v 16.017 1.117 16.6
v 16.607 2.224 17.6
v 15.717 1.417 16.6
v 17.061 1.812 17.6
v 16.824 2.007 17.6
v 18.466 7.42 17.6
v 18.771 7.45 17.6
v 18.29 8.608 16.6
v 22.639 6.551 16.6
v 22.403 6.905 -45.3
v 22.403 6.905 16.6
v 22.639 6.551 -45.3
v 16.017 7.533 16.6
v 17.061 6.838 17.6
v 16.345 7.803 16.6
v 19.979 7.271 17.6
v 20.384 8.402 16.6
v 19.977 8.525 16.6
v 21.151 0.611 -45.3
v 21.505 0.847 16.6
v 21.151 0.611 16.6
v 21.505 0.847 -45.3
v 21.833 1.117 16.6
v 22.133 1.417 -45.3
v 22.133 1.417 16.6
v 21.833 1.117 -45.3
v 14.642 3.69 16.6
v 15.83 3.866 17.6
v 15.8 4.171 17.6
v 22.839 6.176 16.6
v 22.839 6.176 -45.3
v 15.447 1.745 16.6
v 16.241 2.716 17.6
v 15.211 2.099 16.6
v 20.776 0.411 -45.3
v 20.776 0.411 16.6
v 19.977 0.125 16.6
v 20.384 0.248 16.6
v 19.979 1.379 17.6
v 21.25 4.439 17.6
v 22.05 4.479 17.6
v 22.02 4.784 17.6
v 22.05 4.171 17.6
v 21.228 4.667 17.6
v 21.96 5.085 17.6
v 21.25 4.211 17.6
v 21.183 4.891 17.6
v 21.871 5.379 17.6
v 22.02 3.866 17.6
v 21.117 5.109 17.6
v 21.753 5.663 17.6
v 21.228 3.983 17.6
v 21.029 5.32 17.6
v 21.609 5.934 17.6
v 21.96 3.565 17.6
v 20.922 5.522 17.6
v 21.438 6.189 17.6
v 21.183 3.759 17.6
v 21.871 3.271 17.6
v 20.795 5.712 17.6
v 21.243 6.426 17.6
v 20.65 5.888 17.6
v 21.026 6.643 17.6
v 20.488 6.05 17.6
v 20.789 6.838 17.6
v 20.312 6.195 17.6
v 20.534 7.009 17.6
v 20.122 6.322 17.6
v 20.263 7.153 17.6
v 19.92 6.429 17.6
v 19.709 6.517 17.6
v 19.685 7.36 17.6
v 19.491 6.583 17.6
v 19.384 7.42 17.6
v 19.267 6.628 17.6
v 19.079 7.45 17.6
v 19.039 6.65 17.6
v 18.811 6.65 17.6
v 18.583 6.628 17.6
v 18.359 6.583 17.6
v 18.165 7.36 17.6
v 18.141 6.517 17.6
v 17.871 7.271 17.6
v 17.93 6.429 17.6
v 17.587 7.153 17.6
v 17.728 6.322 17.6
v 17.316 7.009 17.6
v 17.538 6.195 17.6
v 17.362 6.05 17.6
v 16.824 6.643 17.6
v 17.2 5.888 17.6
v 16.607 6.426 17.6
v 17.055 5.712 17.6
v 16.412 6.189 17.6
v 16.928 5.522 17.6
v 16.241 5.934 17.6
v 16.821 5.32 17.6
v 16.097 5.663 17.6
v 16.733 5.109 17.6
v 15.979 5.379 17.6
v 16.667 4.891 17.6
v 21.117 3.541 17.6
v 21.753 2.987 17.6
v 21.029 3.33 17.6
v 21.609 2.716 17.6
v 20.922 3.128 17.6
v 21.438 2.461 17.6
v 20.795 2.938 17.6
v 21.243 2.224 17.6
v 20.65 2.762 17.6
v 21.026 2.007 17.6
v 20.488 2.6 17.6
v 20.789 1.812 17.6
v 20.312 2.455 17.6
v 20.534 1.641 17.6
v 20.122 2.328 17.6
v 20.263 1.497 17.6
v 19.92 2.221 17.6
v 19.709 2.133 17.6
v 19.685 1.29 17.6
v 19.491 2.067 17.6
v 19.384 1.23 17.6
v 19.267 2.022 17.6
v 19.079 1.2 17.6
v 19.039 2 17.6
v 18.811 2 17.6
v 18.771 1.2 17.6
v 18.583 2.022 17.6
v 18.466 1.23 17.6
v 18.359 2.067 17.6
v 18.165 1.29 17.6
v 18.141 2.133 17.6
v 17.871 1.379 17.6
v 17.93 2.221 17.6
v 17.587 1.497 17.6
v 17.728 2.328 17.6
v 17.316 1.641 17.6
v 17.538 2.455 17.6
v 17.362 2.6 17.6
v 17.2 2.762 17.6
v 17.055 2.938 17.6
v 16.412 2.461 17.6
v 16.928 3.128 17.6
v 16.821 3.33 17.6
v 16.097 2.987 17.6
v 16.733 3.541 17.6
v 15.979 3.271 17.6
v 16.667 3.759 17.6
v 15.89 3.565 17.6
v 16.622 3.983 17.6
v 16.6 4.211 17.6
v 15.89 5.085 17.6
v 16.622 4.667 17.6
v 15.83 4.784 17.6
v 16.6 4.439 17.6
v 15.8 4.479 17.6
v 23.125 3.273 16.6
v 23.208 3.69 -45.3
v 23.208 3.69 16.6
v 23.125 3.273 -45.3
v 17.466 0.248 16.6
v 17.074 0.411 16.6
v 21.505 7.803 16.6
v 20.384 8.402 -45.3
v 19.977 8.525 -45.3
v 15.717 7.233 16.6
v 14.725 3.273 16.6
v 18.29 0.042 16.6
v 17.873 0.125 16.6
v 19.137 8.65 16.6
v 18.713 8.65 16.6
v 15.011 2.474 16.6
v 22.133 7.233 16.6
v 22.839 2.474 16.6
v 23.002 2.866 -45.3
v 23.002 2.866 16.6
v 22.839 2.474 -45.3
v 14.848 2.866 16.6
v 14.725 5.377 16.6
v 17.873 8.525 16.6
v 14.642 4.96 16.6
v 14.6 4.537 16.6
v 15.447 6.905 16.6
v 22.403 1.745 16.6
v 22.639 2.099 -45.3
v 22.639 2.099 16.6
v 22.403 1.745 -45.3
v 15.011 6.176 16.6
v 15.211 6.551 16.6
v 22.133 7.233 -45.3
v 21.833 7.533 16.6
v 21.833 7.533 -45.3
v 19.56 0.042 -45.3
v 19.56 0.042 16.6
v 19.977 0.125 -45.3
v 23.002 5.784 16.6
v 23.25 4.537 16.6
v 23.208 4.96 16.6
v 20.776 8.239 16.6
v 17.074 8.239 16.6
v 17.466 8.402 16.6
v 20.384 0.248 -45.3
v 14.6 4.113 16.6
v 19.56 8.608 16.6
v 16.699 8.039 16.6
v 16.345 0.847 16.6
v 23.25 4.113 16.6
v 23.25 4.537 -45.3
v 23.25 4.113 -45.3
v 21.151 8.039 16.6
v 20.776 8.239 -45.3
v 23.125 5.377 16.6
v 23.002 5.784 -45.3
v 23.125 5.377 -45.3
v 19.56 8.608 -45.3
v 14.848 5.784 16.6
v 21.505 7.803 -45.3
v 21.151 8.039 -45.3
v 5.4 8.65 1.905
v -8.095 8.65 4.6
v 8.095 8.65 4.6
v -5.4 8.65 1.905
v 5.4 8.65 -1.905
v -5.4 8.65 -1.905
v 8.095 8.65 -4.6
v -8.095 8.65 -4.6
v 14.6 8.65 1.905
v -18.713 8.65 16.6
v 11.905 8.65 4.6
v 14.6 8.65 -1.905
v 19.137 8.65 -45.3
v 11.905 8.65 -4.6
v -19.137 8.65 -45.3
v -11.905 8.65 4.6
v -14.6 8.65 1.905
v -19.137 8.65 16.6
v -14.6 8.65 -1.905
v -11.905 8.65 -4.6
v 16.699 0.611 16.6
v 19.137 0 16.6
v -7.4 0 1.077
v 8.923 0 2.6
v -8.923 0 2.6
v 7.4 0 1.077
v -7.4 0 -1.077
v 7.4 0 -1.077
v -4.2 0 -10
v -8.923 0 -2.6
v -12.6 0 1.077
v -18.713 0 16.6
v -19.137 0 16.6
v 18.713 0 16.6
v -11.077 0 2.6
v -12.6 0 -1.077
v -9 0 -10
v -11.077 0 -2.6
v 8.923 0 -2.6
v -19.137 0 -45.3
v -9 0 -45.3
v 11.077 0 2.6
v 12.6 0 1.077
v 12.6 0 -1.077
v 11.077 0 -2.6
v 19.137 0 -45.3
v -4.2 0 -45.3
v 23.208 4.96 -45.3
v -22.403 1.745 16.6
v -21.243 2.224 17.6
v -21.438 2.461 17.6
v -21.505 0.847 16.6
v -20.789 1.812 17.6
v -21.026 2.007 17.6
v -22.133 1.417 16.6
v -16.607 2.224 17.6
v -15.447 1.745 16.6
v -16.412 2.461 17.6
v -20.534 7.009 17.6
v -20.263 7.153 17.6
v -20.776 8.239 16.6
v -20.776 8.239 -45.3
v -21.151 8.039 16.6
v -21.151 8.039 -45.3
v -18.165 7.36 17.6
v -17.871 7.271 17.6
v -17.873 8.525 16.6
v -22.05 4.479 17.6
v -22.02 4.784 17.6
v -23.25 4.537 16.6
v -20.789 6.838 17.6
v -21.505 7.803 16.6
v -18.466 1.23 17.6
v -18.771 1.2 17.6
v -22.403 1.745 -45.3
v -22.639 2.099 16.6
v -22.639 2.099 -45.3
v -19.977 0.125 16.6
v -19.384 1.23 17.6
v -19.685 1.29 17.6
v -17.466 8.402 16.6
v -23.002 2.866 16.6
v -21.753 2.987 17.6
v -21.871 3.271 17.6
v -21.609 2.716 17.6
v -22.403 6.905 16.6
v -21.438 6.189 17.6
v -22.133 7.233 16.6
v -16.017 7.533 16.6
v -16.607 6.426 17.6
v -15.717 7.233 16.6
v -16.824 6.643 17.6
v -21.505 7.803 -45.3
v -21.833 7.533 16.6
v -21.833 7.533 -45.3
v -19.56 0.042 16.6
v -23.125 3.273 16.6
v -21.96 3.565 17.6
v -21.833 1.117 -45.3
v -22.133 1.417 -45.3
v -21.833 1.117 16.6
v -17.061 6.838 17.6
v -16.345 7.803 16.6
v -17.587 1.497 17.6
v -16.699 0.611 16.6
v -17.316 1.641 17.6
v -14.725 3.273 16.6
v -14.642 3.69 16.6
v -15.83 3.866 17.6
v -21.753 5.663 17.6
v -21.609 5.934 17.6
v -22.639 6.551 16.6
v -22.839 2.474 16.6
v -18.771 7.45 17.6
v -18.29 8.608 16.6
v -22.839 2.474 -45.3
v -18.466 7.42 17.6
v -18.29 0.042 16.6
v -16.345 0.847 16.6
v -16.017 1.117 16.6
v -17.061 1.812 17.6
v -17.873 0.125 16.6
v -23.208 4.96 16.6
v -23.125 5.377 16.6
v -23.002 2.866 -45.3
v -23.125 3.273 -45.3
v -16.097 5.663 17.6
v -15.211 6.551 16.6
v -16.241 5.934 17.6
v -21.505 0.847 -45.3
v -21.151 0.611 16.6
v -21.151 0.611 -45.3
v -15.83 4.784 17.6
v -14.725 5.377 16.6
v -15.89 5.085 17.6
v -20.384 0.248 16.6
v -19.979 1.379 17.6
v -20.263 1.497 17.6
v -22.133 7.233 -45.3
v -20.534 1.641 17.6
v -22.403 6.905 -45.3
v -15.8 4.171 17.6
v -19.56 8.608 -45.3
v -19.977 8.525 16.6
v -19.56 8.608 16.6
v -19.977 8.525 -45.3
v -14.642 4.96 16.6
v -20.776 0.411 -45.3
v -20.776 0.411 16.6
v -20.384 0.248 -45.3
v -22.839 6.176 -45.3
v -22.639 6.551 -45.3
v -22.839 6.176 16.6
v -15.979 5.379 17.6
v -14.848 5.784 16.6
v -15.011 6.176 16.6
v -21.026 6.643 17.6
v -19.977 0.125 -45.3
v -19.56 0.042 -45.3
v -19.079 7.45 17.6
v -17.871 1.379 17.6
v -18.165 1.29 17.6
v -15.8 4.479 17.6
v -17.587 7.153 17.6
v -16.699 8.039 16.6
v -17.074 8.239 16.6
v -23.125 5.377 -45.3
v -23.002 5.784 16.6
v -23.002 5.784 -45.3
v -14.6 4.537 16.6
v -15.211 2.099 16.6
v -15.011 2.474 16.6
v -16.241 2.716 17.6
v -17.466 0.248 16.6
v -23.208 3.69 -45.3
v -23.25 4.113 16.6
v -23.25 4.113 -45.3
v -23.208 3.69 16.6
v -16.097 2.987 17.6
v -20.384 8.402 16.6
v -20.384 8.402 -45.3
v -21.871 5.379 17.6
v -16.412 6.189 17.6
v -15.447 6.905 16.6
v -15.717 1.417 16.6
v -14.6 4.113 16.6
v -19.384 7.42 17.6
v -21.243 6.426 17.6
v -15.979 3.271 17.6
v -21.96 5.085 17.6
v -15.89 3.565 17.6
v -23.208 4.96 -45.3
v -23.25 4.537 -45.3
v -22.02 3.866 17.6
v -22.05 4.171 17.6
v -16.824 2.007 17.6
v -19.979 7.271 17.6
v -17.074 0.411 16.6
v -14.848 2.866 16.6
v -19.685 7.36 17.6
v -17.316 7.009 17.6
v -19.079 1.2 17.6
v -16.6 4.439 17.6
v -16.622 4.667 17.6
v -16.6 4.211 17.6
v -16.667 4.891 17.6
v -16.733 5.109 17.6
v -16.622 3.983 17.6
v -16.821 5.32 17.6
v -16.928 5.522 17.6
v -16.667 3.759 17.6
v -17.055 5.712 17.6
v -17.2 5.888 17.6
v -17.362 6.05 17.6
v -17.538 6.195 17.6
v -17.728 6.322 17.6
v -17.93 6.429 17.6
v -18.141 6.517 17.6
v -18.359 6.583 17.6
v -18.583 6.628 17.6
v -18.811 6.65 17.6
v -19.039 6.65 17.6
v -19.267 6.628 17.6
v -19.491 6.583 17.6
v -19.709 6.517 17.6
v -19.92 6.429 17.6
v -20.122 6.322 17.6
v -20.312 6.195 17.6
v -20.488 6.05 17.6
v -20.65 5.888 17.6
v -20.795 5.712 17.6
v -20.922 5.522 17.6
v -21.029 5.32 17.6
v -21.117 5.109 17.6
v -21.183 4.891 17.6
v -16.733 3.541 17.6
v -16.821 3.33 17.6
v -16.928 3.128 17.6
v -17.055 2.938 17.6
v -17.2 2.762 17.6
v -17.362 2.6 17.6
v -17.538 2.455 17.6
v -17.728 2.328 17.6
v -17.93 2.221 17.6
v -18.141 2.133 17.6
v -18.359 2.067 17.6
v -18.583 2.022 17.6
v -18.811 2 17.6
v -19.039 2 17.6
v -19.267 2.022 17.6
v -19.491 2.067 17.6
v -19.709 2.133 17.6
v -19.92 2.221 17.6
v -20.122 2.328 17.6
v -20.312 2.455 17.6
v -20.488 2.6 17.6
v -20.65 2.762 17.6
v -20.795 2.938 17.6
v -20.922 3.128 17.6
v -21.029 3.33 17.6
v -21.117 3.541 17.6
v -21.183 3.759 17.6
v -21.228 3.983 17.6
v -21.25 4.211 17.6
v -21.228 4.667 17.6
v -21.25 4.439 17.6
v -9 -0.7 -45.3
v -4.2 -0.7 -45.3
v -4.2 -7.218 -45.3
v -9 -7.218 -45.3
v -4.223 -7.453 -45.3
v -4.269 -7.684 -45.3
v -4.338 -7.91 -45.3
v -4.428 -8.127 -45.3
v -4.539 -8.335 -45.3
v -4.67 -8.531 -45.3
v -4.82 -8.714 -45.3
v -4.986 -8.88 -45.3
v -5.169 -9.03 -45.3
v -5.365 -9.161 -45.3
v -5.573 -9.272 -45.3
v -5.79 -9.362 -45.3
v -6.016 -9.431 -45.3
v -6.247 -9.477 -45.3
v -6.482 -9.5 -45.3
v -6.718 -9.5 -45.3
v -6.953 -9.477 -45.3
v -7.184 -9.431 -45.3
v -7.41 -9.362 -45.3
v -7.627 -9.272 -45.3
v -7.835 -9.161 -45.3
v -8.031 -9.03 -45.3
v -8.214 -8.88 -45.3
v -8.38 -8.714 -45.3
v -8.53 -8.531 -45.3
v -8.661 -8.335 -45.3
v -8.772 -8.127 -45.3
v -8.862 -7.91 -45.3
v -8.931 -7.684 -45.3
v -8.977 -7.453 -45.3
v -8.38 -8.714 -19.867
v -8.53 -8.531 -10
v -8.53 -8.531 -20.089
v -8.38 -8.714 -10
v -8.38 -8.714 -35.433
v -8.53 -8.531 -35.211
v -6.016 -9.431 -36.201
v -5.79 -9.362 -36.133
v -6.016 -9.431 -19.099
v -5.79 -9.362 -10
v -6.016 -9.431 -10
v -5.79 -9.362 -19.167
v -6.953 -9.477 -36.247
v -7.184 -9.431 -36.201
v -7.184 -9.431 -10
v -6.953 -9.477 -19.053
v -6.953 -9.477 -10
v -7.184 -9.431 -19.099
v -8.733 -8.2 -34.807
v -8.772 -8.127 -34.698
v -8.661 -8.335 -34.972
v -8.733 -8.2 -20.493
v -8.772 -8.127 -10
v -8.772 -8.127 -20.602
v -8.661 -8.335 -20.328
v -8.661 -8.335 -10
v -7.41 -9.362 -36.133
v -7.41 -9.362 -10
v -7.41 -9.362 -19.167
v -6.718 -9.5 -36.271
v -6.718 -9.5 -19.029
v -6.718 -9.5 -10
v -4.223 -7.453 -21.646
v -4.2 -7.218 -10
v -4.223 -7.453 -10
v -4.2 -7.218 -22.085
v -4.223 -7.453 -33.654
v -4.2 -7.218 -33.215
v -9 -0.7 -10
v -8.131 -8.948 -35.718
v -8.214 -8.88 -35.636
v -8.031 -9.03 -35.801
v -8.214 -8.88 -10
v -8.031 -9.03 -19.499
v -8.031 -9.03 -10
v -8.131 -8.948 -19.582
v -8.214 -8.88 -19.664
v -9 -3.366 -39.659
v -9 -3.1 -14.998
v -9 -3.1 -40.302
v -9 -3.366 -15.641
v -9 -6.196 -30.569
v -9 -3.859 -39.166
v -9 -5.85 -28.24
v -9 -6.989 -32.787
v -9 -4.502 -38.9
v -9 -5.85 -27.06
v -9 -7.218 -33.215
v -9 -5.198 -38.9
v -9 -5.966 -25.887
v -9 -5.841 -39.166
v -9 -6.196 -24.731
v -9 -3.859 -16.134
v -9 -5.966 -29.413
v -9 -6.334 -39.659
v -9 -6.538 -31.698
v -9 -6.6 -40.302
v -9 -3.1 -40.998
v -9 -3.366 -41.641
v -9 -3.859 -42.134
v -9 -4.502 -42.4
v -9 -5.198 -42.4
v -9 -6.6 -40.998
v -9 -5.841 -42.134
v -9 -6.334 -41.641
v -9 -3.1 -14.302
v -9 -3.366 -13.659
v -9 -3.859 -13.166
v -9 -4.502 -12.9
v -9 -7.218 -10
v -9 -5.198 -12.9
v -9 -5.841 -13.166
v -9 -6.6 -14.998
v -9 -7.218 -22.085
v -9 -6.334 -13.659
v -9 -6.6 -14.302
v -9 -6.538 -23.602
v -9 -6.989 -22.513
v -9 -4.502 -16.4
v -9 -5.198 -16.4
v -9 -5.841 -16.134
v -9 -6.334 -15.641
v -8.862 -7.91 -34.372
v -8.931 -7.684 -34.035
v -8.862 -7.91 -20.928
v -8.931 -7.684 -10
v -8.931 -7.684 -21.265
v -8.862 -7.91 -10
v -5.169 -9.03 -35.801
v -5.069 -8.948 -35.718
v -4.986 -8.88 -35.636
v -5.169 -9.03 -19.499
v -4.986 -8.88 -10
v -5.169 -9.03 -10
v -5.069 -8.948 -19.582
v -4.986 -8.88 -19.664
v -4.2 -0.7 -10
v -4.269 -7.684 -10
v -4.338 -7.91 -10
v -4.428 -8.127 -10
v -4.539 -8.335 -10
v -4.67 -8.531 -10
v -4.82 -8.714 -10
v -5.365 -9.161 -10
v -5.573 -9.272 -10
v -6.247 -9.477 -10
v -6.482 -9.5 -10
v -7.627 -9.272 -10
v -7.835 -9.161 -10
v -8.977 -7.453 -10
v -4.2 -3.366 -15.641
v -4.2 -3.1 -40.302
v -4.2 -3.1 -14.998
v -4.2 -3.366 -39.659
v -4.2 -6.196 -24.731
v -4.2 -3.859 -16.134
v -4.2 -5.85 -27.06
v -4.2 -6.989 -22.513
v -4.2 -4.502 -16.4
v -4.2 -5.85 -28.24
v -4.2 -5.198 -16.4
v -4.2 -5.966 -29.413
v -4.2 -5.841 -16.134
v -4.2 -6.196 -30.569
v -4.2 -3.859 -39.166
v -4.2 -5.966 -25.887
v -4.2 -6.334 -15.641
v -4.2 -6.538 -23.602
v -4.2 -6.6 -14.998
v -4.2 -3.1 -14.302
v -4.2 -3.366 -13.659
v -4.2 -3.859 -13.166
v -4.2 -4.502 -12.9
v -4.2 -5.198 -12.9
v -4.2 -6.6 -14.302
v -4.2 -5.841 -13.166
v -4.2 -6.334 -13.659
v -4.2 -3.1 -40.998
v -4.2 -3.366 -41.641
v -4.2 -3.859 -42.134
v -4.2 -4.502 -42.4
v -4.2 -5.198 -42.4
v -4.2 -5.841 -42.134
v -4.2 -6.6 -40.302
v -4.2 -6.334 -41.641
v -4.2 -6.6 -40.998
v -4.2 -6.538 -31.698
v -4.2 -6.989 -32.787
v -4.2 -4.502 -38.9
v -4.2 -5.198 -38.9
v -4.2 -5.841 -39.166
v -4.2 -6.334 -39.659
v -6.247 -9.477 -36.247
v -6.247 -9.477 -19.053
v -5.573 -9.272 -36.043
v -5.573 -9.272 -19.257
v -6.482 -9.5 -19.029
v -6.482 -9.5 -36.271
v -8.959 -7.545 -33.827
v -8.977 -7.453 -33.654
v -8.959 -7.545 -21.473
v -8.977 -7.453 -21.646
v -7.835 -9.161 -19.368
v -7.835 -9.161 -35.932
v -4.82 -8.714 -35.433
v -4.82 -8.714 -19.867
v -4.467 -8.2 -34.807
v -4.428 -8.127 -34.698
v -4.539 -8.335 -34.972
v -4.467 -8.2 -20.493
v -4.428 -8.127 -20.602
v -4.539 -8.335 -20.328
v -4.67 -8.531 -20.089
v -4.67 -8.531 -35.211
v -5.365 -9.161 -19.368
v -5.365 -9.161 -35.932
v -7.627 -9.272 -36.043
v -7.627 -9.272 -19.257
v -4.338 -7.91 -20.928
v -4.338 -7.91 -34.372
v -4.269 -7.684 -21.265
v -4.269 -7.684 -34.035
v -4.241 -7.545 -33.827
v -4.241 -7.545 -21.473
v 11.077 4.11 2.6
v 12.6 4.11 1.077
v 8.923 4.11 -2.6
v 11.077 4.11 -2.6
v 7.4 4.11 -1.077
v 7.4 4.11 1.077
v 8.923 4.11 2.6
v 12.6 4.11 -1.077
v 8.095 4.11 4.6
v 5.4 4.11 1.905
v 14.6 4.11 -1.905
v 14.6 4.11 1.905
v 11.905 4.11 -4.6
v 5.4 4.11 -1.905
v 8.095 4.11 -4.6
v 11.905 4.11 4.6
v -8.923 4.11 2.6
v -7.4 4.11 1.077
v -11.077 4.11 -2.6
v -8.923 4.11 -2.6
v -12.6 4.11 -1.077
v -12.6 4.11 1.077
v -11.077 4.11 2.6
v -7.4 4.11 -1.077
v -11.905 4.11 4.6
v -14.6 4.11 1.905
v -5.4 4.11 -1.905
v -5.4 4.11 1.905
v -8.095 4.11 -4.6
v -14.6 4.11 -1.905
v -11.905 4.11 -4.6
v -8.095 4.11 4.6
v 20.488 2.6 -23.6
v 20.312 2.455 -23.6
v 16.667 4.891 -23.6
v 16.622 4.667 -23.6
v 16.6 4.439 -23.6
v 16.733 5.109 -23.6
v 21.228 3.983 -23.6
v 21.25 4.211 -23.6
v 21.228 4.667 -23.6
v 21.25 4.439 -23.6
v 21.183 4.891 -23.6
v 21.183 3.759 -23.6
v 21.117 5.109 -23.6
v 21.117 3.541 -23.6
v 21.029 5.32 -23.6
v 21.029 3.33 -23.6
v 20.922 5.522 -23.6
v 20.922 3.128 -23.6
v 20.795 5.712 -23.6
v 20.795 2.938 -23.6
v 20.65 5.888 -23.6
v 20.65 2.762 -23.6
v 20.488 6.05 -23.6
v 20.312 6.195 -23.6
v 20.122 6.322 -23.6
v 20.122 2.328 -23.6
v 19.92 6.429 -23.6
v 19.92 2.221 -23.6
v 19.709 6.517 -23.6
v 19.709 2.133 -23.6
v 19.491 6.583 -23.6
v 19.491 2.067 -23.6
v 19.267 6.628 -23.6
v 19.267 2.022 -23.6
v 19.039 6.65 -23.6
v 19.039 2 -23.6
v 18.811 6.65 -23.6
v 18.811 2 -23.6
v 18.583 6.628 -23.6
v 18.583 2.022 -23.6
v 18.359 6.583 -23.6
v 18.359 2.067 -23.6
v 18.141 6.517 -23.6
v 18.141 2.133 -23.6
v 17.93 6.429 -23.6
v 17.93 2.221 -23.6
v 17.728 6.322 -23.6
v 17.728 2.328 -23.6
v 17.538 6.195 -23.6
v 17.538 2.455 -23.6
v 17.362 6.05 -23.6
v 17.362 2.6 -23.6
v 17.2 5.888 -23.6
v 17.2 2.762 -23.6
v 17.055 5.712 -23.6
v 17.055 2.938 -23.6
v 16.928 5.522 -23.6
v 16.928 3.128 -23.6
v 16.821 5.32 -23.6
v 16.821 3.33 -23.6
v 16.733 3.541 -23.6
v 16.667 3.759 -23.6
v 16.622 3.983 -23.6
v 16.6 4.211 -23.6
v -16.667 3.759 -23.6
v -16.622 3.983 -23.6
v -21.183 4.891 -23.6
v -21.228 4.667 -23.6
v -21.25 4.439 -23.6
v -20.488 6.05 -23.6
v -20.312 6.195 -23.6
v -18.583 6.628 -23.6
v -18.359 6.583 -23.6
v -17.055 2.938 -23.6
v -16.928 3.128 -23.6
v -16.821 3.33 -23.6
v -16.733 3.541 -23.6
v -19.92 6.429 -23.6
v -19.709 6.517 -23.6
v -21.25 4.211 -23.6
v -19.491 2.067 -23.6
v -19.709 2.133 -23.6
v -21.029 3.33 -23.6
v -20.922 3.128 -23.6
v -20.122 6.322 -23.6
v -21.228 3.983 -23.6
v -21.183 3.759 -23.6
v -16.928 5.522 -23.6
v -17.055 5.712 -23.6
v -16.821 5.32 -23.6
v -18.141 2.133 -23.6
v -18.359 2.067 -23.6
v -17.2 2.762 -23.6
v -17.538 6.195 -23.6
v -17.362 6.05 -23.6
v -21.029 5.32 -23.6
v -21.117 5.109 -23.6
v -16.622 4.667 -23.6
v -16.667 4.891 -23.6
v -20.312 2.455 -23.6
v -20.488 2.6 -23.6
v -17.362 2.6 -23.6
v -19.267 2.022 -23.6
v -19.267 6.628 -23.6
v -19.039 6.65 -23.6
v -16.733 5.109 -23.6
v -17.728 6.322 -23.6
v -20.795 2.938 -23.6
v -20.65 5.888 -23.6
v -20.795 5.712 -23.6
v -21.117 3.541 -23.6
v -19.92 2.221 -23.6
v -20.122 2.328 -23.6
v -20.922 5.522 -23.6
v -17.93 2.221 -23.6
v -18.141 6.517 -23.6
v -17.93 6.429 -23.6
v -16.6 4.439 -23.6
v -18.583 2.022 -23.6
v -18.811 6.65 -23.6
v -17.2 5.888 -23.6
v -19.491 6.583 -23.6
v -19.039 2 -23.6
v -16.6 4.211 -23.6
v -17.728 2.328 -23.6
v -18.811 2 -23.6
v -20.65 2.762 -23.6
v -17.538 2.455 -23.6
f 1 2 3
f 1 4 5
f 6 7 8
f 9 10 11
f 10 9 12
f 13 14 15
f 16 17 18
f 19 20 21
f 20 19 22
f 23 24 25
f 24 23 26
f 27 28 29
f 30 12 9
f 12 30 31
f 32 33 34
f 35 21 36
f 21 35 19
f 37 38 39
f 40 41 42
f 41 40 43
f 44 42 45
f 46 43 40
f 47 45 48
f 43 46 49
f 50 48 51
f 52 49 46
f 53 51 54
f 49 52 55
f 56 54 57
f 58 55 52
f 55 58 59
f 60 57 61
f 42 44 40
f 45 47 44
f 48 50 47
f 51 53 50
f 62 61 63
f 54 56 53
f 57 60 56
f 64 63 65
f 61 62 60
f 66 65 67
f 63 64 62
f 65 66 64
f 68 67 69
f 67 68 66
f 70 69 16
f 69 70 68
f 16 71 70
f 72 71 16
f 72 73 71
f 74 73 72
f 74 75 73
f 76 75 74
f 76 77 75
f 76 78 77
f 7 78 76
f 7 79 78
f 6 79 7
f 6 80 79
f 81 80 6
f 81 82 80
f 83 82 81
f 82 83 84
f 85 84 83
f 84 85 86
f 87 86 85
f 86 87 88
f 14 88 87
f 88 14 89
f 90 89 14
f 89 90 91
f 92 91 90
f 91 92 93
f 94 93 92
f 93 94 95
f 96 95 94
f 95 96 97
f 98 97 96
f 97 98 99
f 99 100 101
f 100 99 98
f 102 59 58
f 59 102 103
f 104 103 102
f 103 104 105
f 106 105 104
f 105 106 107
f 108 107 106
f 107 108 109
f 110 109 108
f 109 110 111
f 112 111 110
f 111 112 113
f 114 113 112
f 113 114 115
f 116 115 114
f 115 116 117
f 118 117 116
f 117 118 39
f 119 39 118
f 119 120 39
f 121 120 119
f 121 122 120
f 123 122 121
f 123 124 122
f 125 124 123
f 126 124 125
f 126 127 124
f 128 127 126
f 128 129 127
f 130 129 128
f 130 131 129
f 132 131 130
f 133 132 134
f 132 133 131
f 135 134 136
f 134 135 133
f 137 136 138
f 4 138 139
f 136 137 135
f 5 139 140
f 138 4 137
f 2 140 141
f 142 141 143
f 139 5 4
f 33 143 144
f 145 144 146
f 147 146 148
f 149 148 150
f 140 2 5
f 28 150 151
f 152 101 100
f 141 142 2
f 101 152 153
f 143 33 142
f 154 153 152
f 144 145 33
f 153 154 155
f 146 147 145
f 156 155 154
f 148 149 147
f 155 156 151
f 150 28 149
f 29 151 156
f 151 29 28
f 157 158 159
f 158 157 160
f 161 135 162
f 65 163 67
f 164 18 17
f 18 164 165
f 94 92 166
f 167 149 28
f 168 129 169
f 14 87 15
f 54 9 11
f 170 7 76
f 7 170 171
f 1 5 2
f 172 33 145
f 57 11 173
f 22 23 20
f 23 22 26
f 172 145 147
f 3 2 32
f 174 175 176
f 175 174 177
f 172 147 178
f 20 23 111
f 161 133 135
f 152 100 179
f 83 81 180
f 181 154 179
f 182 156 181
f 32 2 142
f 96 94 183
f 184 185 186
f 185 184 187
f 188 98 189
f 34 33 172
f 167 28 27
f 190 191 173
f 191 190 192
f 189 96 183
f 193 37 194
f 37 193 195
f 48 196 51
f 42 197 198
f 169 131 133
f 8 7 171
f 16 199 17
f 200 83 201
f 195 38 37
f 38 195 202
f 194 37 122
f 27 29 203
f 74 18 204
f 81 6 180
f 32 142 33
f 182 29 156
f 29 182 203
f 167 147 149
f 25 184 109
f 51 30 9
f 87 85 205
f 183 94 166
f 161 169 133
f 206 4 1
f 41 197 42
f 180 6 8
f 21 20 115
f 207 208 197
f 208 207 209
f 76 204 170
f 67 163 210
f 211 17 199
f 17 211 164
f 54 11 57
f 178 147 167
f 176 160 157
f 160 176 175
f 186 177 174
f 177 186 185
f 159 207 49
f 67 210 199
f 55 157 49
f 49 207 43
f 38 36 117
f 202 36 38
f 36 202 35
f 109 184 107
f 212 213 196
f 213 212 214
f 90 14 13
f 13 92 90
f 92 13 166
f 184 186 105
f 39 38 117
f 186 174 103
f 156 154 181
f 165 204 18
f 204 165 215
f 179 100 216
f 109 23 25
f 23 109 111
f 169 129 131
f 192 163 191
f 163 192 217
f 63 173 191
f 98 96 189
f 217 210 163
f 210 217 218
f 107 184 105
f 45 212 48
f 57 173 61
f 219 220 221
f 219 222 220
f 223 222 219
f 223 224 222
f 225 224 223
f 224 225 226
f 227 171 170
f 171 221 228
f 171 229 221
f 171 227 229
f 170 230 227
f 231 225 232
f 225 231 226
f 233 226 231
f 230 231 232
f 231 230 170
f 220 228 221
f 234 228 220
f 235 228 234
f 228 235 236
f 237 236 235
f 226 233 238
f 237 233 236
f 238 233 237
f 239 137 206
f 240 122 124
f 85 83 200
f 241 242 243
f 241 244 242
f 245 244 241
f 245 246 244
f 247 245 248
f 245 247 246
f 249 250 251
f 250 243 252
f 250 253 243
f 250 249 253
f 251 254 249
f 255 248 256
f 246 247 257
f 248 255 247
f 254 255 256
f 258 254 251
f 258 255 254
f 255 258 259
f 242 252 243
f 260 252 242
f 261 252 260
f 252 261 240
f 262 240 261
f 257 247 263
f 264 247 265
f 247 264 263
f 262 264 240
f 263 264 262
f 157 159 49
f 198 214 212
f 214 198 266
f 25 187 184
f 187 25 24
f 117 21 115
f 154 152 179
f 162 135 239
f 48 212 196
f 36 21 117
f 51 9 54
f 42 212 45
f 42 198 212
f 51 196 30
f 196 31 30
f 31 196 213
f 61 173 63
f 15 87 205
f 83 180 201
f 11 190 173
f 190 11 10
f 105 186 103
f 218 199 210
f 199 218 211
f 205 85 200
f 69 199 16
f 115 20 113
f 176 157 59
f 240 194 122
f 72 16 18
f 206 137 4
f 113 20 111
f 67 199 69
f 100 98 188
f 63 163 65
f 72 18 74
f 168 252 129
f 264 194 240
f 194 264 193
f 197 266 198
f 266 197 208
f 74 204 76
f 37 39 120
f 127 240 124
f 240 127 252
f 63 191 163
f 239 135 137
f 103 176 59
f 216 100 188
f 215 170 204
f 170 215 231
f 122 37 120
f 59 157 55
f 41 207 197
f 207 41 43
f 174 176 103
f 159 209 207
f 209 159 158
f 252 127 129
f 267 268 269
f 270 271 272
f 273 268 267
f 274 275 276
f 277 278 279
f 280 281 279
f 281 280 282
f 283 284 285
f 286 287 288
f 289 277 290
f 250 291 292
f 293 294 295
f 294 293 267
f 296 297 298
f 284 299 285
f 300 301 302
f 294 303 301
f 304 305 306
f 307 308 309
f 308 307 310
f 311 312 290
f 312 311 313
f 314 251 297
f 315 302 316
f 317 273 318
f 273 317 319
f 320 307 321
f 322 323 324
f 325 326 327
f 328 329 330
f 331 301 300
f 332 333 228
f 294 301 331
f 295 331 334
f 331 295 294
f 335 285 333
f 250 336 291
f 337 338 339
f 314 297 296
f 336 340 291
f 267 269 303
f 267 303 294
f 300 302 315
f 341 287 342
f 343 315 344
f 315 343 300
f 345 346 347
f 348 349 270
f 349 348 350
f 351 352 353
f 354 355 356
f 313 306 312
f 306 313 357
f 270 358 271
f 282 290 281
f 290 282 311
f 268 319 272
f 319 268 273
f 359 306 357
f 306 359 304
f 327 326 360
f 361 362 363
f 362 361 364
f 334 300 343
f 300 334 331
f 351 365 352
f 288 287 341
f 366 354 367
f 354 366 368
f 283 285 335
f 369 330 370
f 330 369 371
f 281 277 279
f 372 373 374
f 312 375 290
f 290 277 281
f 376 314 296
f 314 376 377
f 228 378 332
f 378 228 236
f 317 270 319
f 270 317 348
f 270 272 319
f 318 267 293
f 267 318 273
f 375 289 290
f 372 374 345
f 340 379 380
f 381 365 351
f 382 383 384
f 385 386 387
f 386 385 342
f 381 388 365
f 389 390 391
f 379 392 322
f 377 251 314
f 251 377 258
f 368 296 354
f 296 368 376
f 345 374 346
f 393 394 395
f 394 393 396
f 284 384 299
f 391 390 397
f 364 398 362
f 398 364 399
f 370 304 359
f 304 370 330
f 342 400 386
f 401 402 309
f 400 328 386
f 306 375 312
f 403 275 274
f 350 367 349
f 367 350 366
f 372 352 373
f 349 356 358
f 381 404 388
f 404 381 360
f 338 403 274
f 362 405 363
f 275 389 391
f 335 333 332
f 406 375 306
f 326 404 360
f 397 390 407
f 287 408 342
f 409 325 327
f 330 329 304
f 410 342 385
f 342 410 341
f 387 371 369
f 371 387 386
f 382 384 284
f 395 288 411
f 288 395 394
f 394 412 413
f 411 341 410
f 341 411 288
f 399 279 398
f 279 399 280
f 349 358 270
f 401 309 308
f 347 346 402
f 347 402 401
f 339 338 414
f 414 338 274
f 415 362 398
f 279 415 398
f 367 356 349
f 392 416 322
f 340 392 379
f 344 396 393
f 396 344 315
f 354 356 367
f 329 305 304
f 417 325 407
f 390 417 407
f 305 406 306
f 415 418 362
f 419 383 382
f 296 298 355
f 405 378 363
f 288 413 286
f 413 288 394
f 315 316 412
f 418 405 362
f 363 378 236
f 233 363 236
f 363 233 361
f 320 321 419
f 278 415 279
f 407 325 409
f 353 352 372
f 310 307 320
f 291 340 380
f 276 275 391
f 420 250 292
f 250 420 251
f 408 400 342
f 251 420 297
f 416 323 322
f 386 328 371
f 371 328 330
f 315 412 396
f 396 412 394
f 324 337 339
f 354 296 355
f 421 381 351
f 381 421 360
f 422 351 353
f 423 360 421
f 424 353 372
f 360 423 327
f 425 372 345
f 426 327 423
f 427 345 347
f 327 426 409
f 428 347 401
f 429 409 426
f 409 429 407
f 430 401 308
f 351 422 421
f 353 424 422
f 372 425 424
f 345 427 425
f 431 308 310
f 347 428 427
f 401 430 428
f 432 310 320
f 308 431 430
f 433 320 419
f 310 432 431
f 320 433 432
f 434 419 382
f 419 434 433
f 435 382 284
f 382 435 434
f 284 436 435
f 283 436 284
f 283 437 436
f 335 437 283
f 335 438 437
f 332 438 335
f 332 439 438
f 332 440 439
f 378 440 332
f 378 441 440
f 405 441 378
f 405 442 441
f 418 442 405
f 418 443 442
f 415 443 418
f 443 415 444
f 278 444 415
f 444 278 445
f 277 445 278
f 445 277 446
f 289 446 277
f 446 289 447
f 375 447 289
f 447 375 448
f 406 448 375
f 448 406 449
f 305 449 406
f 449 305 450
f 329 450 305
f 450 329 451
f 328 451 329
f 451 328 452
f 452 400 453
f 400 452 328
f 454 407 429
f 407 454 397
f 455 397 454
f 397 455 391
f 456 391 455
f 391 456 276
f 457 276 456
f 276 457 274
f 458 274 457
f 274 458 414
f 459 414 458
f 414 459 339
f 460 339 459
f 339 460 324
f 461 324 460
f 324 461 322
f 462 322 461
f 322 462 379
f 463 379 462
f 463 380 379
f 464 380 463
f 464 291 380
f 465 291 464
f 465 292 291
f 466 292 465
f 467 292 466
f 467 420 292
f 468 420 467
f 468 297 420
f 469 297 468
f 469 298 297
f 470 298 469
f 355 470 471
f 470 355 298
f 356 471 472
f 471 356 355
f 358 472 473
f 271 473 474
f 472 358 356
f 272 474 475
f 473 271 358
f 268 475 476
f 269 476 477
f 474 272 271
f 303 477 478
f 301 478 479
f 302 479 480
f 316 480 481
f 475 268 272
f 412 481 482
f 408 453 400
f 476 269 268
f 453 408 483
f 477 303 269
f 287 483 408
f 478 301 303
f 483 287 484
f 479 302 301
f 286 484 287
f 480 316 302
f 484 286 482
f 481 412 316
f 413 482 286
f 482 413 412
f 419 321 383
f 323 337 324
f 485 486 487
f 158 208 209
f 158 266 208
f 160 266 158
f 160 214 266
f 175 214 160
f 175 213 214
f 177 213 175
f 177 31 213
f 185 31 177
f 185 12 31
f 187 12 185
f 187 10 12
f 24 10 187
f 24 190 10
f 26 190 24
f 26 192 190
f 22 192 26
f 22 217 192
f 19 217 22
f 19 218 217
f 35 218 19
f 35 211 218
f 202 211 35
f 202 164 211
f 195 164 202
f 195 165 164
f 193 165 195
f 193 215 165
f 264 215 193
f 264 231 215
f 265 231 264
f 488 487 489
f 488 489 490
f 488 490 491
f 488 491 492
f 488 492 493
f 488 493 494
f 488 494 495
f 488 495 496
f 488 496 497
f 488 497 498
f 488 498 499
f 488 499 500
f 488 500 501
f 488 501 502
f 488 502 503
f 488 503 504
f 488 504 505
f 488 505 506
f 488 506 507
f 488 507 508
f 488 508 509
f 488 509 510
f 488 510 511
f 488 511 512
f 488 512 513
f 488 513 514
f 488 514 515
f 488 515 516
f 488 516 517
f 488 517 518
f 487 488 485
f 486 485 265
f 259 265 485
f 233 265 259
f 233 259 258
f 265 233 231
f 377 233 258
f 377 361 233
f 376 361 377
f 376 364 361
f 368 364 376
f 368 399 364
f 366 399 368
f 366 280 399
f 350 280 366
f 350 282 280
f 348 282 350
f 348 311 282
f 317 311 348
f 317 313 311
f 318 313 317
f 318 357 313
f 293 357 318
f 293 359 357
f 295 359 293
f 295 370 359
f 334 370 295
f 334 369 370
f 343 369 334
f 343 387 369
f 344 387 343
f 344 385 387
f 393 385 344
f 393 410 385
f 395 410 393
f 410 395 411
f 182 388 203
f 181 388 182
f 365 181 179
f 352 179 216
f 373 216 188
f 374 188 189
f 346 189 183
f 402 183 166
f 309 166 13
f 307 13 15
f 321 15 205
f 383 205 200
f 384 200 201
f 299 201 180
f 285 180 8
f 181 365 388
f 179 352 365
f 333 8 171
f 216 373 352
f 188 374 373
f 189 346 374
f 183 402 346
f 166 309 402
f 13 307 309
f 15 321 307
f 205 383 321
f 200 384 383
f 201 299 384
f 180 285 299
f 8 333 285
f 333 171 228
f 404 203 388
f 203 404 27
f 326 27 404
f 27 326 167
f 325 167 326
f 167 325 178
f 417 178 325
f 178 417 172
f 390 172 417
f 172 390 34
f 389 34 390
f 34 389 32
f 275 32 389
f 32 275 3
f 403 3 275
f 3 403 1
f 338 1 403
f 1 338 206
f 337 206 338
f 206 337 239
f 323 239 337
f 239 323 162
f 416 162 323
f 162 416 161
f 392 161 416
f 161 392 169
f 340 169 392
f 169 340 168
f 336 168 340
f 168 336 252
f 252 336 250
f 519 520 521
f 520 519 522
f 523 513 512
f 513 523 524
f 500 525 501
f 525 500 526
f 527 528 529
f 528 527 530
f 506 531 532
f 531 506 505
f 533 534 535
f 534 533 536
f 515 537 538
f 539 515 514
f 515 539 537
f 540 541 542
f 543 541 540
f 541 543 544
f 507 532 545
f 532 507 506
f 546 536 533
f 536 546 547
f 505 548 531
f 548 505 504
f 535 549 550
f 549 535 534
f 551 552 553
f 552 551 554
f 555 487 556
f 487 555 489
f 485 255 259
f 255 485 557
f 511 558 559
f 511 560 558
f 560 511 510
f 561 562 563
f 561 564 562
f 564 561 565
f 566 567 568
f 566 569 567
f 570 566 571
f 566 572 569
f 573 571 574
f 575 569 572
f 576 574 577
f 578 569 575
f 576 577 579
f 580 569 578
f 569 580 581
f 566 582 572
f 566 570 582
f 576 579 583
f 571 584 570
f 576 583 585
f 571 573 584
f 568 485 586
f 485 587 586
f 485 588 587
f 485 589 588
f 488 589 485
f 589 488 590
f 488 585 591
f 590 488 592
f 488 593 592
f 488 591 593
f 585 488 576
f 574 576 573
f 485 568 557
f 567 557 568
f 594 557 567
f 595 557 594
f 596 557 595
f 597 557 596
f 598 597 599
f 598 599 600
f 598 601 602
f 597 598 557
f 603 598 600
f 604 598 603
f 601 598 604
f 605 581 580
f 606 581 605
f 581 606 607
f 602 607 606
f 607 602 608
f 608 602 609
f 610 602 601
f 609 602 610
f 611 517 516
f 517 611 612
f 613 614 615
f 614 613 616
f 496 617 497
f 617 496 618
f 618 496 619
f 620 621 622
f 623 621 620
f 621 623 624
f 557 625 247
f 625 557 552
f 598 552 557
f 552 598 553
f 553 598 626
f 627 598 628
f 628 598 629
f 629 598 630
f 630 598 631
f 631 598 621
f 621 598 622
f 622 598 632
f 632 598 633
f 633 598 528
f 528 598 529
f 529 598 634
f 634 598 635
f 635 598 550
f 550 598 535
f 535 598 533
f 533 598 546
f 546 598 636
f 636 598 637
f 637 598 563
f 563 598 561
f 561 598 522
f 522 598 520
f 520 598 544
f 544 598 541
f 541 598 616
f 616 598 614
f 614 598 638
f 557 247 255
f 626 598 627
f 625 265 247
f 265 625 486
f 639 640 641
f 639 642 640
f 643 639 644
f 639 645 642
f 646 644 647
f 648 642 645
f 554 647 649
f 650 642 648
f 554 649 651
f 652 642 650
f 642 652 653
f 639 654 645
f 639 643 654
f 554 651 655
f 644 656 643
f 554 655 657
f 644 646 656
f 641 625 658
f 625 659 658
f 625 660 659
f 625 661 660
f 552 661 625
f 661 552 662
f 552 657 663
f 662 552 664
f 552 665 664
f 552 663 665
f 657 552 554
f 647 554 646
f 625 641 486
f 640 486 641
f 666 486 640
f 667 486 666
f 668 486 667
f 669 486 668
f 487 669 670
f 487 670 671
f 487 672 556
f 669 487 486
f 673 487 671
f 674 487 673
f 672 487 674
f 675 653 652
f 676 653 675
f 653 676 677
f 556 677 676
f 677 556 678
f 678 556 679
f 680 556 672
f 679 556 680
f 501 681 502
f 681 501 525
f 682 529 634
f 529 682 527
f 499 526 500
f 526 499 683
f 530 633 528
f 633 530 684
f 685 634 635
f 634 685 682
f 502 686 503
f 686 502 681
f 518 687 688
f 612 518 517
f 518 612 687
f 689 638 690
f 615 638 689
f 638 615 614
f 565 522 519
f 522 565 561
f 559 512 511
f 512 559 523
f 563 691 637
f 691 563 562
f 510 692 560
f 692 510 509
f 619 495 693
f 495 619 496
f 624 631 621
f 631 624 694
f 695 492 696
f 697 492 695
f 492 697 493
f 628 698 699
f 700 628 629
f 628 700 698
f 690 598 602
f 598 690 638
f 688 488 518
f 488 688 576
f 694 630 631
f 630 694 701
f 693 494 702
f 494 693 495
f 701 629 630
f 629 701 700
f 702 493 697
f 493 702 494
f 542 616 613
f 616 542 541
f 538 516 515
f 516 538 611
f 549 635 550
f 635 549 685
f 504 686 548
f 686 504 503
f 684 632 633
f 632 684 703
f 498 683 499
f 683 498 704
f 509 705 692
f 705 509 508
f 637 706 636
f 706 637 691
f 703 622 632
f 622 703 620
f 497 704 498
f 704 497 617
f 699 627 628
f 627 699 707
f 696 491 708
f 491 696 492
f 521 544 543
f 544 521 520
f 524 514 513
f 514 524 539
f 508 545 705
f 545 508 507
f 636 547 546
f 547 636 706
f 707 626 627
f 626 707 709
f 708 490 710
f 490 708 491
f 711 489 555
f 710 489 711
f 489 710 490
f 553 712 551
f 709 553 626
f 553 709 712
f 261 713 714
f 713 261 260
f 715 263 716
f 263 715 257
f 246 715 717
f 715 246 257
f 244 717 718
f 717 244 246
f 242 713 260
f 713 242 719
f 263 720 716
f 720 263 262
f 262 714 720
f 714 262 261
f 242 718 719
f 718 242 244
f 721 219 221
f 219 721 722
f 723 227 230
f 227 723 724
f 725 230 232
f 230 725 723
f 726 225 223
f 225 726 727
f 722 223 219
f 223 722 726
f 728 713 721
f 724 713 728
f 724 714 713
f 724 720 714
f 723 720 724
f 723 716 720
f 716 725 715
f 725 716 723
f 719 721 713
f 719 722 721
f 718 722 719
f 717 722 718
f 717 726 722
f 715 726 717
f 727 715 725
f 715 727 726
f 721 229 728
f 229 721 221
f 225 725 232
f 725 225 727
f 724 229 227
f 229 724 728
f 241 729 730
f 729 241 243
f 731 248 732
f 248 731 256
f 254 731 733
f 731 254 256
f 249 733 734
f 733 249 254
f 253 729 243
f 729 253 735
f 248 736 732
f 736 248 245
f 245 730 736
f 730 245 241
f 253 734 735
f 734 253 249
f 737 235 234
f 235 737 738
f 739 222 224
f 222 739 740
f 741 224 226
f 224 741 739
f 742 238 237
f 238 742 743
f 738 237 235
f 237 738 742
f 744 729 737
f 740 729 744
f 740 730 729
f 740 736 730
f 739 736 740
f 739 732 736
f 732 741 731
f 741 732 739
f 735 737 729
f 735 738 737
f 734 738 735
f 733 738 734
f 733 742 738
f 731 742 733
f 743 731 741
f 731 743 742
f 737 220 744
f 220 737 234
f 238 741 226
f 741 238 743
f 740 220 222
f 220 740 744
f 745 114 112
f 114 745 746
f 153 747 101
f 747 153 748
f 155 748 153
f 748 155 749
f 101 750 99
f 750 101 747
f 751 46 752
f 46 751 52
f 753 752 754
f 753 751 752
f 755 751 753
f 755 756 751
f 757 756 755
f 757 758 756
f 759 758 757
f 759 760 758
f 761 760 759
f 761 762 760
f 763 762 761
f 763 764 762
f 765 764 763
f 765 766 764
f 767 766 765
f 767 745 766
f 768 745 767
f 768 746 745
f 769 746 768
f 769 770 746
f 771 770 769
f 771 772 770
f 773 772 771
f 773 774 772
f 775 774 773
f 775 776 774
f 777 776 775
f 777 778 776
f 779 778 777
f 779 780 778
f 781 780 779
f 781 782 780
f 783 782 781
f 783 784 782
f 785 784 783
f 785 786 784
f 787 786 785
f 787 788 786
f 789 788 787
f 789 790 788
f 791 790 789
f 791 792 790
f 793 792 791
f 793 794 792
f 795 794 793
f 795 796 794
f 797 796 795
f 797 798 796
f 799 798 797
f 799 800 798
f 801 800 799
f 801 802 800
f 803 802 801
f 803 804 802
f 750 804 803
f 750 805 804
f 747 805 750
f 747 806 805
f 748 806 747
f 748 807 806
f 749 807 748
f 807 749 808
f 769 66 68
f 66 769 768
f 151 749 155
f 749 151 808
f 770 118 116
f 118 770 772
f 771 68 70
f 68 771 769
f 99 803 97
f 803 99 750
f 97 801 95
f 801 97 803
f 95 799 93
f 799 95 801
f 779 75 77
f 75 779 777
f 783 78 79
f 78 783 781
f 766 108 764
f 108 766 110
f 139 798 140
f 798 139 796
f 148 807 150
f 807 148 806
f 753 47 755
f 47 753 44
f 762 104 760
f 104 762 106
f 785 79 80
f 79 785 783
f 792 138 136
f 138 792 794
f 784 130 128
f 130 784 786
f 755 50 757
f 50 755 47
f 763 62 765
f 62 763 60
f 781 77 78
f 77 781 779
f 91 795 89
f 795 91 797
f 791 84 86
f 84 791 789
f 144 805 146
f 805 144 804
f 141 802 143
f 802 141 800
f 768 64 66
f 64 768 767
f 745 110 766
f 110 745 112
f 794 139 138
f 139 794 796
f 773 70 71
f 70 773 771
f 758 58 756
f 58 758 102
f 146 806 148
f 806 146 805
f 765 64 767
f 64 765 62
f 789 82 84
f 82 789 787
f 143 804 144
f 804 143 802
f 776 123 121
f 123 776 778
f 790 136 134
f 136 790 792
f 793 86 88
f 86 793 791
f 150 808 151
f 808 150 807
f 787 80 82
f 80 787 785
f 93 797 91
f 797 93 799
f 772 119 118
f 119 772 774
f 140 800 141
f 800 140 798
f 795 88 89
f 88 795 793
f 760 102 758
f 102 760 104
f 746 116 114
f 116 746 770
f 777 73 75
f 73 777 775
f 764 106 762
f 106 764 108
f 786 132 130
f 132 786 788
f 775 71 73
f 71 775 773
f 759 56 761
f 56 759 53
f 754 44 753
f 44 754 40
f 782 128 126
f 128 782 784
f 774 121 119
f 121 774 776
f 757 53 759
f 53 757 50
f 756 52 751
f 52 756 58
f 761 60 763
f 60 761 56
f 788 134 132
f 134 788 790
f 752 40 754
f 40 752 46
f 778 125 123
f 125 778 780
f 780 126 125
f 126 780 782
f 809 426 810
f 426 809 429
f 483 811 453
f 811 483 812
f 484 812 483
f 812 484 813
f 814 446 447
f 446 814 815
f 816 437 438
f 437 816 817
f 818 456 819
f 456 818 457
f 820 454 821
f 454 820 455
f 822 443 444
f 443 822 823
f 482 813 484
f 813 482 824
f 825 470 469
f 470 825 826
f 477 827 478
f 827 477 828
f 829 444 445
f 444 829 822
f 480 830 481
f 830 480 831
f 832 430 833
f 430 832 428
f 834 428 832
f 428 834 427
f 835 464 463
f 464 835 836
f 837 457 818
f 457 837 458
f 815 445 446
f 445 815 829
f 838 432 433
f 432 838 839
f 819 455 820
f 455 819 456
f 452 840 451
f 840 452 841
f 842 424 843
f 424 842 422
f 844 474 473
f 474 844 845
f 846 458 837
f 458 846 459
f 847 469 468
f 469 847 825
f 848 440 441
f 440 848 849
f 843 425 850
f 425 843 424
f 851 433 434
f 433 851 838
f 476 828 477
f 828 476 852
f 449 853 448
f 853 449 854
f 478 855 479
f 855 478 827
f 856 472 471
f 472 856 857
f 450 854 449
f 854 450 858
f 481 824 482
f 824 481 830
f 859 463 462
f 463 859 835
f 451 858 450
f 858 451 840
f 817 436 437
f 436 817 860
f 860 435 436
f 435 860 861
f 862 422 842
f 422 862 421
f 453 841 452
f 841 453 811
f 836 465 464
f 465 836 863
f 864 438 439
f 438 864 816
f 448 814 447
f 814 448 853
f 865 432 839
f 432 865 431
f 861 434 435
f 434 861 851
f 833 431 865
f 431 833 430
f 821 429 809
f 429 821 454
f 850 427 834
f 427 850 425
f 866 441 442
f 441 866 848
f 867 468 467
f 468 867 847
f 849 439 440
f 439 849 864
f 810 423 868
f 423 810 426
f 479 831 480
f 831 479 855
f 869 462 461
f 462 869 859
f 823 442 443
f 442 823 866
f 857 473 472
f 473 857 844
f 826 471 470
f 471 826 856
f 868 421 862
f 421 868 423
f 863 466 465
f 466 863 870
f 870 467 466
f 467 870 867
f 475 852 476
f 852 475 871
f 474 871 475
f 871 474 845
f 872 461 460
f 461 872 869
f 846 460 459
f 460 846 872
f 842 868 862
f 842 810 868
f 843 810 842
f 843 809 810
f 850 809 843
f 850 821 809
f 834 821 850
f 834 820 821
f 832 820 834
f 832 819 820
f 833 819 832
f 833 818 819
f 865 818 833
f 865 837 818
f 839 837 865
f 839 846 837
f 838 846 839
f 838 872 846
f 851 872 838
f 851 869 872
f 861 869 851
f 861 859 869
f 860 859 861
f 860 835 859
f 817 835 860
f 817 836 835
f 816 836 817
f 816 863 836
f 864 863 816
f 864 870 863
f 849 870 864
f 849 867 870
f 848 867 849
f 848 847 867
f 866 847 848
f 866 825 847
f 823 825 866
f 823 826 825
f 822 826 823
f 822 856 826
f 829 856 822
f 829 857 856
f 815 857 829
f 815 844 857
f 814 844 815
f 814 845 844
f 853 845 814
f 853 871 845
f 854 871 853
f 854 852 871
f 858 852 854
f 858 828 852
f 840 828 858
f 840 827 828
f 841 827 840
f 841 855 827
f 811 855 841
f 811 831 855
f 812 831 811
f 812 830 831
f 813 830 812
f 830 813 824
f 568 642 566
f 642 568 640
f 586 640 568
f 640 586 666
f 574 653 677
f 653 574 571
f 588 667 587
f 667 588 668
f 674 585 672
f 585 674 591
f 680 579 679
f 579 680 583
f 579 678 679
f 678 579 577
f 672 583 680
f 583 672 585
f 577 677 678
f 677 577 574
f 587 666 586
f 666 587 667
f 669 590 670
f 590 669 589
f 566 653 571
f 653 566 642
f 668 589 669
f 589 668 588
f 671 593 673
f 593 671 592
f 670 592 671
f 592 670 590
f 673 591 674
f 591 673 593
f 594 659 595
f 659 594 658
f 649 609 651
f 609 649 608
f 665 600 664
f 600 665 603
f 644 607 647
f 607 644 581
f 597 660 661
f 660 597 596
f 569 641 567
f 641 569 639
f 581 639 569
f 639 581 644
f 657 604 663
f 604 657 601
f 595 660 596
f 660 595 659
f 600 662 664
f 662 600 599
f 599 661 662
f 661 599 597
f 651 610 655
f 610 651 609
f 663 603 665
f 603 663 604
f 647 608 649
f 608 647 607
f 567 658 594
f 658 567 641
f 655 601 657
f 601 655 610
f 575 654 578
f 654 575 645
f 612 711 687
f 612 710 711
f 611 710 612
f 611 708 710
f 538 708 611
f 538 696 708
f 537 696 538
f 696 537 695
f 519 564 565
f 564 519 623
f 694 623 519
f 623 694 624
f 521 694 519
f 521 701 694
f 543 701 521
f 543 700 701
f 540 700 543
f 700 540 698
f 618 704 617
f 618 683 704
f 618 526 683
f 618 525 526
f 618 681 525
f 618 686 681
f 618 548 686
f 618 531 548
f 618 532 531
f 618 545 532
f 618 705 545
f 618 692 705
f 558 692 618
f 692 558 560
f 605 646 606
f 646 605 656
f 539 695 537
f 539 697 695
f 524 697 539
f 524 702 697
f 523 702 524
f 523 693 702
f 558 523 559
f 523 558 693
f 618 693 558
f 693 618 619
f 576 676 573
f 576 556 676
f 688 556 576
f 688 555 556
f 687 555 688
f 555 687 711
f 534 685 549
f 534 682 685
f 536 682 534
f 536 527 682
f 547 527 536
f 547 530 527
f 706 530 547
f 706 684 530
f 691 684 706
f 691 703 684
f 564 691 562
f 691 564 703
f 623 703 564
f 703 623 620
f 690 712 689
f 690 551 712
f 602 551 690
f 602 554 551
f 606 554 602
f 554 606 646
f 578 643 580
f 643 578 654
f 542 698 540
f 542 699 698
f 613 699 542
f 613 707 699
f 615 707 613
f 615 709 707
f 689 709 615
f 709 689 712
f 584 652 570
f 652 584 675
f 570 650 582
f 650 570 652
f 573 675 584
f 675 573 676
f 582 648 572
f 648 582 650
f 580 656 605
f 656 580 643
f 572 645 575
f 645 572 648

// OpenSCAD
use <../sketch-for-simpler.scad>;

rotate([0,180,0]) {
  y_endcap();
}
